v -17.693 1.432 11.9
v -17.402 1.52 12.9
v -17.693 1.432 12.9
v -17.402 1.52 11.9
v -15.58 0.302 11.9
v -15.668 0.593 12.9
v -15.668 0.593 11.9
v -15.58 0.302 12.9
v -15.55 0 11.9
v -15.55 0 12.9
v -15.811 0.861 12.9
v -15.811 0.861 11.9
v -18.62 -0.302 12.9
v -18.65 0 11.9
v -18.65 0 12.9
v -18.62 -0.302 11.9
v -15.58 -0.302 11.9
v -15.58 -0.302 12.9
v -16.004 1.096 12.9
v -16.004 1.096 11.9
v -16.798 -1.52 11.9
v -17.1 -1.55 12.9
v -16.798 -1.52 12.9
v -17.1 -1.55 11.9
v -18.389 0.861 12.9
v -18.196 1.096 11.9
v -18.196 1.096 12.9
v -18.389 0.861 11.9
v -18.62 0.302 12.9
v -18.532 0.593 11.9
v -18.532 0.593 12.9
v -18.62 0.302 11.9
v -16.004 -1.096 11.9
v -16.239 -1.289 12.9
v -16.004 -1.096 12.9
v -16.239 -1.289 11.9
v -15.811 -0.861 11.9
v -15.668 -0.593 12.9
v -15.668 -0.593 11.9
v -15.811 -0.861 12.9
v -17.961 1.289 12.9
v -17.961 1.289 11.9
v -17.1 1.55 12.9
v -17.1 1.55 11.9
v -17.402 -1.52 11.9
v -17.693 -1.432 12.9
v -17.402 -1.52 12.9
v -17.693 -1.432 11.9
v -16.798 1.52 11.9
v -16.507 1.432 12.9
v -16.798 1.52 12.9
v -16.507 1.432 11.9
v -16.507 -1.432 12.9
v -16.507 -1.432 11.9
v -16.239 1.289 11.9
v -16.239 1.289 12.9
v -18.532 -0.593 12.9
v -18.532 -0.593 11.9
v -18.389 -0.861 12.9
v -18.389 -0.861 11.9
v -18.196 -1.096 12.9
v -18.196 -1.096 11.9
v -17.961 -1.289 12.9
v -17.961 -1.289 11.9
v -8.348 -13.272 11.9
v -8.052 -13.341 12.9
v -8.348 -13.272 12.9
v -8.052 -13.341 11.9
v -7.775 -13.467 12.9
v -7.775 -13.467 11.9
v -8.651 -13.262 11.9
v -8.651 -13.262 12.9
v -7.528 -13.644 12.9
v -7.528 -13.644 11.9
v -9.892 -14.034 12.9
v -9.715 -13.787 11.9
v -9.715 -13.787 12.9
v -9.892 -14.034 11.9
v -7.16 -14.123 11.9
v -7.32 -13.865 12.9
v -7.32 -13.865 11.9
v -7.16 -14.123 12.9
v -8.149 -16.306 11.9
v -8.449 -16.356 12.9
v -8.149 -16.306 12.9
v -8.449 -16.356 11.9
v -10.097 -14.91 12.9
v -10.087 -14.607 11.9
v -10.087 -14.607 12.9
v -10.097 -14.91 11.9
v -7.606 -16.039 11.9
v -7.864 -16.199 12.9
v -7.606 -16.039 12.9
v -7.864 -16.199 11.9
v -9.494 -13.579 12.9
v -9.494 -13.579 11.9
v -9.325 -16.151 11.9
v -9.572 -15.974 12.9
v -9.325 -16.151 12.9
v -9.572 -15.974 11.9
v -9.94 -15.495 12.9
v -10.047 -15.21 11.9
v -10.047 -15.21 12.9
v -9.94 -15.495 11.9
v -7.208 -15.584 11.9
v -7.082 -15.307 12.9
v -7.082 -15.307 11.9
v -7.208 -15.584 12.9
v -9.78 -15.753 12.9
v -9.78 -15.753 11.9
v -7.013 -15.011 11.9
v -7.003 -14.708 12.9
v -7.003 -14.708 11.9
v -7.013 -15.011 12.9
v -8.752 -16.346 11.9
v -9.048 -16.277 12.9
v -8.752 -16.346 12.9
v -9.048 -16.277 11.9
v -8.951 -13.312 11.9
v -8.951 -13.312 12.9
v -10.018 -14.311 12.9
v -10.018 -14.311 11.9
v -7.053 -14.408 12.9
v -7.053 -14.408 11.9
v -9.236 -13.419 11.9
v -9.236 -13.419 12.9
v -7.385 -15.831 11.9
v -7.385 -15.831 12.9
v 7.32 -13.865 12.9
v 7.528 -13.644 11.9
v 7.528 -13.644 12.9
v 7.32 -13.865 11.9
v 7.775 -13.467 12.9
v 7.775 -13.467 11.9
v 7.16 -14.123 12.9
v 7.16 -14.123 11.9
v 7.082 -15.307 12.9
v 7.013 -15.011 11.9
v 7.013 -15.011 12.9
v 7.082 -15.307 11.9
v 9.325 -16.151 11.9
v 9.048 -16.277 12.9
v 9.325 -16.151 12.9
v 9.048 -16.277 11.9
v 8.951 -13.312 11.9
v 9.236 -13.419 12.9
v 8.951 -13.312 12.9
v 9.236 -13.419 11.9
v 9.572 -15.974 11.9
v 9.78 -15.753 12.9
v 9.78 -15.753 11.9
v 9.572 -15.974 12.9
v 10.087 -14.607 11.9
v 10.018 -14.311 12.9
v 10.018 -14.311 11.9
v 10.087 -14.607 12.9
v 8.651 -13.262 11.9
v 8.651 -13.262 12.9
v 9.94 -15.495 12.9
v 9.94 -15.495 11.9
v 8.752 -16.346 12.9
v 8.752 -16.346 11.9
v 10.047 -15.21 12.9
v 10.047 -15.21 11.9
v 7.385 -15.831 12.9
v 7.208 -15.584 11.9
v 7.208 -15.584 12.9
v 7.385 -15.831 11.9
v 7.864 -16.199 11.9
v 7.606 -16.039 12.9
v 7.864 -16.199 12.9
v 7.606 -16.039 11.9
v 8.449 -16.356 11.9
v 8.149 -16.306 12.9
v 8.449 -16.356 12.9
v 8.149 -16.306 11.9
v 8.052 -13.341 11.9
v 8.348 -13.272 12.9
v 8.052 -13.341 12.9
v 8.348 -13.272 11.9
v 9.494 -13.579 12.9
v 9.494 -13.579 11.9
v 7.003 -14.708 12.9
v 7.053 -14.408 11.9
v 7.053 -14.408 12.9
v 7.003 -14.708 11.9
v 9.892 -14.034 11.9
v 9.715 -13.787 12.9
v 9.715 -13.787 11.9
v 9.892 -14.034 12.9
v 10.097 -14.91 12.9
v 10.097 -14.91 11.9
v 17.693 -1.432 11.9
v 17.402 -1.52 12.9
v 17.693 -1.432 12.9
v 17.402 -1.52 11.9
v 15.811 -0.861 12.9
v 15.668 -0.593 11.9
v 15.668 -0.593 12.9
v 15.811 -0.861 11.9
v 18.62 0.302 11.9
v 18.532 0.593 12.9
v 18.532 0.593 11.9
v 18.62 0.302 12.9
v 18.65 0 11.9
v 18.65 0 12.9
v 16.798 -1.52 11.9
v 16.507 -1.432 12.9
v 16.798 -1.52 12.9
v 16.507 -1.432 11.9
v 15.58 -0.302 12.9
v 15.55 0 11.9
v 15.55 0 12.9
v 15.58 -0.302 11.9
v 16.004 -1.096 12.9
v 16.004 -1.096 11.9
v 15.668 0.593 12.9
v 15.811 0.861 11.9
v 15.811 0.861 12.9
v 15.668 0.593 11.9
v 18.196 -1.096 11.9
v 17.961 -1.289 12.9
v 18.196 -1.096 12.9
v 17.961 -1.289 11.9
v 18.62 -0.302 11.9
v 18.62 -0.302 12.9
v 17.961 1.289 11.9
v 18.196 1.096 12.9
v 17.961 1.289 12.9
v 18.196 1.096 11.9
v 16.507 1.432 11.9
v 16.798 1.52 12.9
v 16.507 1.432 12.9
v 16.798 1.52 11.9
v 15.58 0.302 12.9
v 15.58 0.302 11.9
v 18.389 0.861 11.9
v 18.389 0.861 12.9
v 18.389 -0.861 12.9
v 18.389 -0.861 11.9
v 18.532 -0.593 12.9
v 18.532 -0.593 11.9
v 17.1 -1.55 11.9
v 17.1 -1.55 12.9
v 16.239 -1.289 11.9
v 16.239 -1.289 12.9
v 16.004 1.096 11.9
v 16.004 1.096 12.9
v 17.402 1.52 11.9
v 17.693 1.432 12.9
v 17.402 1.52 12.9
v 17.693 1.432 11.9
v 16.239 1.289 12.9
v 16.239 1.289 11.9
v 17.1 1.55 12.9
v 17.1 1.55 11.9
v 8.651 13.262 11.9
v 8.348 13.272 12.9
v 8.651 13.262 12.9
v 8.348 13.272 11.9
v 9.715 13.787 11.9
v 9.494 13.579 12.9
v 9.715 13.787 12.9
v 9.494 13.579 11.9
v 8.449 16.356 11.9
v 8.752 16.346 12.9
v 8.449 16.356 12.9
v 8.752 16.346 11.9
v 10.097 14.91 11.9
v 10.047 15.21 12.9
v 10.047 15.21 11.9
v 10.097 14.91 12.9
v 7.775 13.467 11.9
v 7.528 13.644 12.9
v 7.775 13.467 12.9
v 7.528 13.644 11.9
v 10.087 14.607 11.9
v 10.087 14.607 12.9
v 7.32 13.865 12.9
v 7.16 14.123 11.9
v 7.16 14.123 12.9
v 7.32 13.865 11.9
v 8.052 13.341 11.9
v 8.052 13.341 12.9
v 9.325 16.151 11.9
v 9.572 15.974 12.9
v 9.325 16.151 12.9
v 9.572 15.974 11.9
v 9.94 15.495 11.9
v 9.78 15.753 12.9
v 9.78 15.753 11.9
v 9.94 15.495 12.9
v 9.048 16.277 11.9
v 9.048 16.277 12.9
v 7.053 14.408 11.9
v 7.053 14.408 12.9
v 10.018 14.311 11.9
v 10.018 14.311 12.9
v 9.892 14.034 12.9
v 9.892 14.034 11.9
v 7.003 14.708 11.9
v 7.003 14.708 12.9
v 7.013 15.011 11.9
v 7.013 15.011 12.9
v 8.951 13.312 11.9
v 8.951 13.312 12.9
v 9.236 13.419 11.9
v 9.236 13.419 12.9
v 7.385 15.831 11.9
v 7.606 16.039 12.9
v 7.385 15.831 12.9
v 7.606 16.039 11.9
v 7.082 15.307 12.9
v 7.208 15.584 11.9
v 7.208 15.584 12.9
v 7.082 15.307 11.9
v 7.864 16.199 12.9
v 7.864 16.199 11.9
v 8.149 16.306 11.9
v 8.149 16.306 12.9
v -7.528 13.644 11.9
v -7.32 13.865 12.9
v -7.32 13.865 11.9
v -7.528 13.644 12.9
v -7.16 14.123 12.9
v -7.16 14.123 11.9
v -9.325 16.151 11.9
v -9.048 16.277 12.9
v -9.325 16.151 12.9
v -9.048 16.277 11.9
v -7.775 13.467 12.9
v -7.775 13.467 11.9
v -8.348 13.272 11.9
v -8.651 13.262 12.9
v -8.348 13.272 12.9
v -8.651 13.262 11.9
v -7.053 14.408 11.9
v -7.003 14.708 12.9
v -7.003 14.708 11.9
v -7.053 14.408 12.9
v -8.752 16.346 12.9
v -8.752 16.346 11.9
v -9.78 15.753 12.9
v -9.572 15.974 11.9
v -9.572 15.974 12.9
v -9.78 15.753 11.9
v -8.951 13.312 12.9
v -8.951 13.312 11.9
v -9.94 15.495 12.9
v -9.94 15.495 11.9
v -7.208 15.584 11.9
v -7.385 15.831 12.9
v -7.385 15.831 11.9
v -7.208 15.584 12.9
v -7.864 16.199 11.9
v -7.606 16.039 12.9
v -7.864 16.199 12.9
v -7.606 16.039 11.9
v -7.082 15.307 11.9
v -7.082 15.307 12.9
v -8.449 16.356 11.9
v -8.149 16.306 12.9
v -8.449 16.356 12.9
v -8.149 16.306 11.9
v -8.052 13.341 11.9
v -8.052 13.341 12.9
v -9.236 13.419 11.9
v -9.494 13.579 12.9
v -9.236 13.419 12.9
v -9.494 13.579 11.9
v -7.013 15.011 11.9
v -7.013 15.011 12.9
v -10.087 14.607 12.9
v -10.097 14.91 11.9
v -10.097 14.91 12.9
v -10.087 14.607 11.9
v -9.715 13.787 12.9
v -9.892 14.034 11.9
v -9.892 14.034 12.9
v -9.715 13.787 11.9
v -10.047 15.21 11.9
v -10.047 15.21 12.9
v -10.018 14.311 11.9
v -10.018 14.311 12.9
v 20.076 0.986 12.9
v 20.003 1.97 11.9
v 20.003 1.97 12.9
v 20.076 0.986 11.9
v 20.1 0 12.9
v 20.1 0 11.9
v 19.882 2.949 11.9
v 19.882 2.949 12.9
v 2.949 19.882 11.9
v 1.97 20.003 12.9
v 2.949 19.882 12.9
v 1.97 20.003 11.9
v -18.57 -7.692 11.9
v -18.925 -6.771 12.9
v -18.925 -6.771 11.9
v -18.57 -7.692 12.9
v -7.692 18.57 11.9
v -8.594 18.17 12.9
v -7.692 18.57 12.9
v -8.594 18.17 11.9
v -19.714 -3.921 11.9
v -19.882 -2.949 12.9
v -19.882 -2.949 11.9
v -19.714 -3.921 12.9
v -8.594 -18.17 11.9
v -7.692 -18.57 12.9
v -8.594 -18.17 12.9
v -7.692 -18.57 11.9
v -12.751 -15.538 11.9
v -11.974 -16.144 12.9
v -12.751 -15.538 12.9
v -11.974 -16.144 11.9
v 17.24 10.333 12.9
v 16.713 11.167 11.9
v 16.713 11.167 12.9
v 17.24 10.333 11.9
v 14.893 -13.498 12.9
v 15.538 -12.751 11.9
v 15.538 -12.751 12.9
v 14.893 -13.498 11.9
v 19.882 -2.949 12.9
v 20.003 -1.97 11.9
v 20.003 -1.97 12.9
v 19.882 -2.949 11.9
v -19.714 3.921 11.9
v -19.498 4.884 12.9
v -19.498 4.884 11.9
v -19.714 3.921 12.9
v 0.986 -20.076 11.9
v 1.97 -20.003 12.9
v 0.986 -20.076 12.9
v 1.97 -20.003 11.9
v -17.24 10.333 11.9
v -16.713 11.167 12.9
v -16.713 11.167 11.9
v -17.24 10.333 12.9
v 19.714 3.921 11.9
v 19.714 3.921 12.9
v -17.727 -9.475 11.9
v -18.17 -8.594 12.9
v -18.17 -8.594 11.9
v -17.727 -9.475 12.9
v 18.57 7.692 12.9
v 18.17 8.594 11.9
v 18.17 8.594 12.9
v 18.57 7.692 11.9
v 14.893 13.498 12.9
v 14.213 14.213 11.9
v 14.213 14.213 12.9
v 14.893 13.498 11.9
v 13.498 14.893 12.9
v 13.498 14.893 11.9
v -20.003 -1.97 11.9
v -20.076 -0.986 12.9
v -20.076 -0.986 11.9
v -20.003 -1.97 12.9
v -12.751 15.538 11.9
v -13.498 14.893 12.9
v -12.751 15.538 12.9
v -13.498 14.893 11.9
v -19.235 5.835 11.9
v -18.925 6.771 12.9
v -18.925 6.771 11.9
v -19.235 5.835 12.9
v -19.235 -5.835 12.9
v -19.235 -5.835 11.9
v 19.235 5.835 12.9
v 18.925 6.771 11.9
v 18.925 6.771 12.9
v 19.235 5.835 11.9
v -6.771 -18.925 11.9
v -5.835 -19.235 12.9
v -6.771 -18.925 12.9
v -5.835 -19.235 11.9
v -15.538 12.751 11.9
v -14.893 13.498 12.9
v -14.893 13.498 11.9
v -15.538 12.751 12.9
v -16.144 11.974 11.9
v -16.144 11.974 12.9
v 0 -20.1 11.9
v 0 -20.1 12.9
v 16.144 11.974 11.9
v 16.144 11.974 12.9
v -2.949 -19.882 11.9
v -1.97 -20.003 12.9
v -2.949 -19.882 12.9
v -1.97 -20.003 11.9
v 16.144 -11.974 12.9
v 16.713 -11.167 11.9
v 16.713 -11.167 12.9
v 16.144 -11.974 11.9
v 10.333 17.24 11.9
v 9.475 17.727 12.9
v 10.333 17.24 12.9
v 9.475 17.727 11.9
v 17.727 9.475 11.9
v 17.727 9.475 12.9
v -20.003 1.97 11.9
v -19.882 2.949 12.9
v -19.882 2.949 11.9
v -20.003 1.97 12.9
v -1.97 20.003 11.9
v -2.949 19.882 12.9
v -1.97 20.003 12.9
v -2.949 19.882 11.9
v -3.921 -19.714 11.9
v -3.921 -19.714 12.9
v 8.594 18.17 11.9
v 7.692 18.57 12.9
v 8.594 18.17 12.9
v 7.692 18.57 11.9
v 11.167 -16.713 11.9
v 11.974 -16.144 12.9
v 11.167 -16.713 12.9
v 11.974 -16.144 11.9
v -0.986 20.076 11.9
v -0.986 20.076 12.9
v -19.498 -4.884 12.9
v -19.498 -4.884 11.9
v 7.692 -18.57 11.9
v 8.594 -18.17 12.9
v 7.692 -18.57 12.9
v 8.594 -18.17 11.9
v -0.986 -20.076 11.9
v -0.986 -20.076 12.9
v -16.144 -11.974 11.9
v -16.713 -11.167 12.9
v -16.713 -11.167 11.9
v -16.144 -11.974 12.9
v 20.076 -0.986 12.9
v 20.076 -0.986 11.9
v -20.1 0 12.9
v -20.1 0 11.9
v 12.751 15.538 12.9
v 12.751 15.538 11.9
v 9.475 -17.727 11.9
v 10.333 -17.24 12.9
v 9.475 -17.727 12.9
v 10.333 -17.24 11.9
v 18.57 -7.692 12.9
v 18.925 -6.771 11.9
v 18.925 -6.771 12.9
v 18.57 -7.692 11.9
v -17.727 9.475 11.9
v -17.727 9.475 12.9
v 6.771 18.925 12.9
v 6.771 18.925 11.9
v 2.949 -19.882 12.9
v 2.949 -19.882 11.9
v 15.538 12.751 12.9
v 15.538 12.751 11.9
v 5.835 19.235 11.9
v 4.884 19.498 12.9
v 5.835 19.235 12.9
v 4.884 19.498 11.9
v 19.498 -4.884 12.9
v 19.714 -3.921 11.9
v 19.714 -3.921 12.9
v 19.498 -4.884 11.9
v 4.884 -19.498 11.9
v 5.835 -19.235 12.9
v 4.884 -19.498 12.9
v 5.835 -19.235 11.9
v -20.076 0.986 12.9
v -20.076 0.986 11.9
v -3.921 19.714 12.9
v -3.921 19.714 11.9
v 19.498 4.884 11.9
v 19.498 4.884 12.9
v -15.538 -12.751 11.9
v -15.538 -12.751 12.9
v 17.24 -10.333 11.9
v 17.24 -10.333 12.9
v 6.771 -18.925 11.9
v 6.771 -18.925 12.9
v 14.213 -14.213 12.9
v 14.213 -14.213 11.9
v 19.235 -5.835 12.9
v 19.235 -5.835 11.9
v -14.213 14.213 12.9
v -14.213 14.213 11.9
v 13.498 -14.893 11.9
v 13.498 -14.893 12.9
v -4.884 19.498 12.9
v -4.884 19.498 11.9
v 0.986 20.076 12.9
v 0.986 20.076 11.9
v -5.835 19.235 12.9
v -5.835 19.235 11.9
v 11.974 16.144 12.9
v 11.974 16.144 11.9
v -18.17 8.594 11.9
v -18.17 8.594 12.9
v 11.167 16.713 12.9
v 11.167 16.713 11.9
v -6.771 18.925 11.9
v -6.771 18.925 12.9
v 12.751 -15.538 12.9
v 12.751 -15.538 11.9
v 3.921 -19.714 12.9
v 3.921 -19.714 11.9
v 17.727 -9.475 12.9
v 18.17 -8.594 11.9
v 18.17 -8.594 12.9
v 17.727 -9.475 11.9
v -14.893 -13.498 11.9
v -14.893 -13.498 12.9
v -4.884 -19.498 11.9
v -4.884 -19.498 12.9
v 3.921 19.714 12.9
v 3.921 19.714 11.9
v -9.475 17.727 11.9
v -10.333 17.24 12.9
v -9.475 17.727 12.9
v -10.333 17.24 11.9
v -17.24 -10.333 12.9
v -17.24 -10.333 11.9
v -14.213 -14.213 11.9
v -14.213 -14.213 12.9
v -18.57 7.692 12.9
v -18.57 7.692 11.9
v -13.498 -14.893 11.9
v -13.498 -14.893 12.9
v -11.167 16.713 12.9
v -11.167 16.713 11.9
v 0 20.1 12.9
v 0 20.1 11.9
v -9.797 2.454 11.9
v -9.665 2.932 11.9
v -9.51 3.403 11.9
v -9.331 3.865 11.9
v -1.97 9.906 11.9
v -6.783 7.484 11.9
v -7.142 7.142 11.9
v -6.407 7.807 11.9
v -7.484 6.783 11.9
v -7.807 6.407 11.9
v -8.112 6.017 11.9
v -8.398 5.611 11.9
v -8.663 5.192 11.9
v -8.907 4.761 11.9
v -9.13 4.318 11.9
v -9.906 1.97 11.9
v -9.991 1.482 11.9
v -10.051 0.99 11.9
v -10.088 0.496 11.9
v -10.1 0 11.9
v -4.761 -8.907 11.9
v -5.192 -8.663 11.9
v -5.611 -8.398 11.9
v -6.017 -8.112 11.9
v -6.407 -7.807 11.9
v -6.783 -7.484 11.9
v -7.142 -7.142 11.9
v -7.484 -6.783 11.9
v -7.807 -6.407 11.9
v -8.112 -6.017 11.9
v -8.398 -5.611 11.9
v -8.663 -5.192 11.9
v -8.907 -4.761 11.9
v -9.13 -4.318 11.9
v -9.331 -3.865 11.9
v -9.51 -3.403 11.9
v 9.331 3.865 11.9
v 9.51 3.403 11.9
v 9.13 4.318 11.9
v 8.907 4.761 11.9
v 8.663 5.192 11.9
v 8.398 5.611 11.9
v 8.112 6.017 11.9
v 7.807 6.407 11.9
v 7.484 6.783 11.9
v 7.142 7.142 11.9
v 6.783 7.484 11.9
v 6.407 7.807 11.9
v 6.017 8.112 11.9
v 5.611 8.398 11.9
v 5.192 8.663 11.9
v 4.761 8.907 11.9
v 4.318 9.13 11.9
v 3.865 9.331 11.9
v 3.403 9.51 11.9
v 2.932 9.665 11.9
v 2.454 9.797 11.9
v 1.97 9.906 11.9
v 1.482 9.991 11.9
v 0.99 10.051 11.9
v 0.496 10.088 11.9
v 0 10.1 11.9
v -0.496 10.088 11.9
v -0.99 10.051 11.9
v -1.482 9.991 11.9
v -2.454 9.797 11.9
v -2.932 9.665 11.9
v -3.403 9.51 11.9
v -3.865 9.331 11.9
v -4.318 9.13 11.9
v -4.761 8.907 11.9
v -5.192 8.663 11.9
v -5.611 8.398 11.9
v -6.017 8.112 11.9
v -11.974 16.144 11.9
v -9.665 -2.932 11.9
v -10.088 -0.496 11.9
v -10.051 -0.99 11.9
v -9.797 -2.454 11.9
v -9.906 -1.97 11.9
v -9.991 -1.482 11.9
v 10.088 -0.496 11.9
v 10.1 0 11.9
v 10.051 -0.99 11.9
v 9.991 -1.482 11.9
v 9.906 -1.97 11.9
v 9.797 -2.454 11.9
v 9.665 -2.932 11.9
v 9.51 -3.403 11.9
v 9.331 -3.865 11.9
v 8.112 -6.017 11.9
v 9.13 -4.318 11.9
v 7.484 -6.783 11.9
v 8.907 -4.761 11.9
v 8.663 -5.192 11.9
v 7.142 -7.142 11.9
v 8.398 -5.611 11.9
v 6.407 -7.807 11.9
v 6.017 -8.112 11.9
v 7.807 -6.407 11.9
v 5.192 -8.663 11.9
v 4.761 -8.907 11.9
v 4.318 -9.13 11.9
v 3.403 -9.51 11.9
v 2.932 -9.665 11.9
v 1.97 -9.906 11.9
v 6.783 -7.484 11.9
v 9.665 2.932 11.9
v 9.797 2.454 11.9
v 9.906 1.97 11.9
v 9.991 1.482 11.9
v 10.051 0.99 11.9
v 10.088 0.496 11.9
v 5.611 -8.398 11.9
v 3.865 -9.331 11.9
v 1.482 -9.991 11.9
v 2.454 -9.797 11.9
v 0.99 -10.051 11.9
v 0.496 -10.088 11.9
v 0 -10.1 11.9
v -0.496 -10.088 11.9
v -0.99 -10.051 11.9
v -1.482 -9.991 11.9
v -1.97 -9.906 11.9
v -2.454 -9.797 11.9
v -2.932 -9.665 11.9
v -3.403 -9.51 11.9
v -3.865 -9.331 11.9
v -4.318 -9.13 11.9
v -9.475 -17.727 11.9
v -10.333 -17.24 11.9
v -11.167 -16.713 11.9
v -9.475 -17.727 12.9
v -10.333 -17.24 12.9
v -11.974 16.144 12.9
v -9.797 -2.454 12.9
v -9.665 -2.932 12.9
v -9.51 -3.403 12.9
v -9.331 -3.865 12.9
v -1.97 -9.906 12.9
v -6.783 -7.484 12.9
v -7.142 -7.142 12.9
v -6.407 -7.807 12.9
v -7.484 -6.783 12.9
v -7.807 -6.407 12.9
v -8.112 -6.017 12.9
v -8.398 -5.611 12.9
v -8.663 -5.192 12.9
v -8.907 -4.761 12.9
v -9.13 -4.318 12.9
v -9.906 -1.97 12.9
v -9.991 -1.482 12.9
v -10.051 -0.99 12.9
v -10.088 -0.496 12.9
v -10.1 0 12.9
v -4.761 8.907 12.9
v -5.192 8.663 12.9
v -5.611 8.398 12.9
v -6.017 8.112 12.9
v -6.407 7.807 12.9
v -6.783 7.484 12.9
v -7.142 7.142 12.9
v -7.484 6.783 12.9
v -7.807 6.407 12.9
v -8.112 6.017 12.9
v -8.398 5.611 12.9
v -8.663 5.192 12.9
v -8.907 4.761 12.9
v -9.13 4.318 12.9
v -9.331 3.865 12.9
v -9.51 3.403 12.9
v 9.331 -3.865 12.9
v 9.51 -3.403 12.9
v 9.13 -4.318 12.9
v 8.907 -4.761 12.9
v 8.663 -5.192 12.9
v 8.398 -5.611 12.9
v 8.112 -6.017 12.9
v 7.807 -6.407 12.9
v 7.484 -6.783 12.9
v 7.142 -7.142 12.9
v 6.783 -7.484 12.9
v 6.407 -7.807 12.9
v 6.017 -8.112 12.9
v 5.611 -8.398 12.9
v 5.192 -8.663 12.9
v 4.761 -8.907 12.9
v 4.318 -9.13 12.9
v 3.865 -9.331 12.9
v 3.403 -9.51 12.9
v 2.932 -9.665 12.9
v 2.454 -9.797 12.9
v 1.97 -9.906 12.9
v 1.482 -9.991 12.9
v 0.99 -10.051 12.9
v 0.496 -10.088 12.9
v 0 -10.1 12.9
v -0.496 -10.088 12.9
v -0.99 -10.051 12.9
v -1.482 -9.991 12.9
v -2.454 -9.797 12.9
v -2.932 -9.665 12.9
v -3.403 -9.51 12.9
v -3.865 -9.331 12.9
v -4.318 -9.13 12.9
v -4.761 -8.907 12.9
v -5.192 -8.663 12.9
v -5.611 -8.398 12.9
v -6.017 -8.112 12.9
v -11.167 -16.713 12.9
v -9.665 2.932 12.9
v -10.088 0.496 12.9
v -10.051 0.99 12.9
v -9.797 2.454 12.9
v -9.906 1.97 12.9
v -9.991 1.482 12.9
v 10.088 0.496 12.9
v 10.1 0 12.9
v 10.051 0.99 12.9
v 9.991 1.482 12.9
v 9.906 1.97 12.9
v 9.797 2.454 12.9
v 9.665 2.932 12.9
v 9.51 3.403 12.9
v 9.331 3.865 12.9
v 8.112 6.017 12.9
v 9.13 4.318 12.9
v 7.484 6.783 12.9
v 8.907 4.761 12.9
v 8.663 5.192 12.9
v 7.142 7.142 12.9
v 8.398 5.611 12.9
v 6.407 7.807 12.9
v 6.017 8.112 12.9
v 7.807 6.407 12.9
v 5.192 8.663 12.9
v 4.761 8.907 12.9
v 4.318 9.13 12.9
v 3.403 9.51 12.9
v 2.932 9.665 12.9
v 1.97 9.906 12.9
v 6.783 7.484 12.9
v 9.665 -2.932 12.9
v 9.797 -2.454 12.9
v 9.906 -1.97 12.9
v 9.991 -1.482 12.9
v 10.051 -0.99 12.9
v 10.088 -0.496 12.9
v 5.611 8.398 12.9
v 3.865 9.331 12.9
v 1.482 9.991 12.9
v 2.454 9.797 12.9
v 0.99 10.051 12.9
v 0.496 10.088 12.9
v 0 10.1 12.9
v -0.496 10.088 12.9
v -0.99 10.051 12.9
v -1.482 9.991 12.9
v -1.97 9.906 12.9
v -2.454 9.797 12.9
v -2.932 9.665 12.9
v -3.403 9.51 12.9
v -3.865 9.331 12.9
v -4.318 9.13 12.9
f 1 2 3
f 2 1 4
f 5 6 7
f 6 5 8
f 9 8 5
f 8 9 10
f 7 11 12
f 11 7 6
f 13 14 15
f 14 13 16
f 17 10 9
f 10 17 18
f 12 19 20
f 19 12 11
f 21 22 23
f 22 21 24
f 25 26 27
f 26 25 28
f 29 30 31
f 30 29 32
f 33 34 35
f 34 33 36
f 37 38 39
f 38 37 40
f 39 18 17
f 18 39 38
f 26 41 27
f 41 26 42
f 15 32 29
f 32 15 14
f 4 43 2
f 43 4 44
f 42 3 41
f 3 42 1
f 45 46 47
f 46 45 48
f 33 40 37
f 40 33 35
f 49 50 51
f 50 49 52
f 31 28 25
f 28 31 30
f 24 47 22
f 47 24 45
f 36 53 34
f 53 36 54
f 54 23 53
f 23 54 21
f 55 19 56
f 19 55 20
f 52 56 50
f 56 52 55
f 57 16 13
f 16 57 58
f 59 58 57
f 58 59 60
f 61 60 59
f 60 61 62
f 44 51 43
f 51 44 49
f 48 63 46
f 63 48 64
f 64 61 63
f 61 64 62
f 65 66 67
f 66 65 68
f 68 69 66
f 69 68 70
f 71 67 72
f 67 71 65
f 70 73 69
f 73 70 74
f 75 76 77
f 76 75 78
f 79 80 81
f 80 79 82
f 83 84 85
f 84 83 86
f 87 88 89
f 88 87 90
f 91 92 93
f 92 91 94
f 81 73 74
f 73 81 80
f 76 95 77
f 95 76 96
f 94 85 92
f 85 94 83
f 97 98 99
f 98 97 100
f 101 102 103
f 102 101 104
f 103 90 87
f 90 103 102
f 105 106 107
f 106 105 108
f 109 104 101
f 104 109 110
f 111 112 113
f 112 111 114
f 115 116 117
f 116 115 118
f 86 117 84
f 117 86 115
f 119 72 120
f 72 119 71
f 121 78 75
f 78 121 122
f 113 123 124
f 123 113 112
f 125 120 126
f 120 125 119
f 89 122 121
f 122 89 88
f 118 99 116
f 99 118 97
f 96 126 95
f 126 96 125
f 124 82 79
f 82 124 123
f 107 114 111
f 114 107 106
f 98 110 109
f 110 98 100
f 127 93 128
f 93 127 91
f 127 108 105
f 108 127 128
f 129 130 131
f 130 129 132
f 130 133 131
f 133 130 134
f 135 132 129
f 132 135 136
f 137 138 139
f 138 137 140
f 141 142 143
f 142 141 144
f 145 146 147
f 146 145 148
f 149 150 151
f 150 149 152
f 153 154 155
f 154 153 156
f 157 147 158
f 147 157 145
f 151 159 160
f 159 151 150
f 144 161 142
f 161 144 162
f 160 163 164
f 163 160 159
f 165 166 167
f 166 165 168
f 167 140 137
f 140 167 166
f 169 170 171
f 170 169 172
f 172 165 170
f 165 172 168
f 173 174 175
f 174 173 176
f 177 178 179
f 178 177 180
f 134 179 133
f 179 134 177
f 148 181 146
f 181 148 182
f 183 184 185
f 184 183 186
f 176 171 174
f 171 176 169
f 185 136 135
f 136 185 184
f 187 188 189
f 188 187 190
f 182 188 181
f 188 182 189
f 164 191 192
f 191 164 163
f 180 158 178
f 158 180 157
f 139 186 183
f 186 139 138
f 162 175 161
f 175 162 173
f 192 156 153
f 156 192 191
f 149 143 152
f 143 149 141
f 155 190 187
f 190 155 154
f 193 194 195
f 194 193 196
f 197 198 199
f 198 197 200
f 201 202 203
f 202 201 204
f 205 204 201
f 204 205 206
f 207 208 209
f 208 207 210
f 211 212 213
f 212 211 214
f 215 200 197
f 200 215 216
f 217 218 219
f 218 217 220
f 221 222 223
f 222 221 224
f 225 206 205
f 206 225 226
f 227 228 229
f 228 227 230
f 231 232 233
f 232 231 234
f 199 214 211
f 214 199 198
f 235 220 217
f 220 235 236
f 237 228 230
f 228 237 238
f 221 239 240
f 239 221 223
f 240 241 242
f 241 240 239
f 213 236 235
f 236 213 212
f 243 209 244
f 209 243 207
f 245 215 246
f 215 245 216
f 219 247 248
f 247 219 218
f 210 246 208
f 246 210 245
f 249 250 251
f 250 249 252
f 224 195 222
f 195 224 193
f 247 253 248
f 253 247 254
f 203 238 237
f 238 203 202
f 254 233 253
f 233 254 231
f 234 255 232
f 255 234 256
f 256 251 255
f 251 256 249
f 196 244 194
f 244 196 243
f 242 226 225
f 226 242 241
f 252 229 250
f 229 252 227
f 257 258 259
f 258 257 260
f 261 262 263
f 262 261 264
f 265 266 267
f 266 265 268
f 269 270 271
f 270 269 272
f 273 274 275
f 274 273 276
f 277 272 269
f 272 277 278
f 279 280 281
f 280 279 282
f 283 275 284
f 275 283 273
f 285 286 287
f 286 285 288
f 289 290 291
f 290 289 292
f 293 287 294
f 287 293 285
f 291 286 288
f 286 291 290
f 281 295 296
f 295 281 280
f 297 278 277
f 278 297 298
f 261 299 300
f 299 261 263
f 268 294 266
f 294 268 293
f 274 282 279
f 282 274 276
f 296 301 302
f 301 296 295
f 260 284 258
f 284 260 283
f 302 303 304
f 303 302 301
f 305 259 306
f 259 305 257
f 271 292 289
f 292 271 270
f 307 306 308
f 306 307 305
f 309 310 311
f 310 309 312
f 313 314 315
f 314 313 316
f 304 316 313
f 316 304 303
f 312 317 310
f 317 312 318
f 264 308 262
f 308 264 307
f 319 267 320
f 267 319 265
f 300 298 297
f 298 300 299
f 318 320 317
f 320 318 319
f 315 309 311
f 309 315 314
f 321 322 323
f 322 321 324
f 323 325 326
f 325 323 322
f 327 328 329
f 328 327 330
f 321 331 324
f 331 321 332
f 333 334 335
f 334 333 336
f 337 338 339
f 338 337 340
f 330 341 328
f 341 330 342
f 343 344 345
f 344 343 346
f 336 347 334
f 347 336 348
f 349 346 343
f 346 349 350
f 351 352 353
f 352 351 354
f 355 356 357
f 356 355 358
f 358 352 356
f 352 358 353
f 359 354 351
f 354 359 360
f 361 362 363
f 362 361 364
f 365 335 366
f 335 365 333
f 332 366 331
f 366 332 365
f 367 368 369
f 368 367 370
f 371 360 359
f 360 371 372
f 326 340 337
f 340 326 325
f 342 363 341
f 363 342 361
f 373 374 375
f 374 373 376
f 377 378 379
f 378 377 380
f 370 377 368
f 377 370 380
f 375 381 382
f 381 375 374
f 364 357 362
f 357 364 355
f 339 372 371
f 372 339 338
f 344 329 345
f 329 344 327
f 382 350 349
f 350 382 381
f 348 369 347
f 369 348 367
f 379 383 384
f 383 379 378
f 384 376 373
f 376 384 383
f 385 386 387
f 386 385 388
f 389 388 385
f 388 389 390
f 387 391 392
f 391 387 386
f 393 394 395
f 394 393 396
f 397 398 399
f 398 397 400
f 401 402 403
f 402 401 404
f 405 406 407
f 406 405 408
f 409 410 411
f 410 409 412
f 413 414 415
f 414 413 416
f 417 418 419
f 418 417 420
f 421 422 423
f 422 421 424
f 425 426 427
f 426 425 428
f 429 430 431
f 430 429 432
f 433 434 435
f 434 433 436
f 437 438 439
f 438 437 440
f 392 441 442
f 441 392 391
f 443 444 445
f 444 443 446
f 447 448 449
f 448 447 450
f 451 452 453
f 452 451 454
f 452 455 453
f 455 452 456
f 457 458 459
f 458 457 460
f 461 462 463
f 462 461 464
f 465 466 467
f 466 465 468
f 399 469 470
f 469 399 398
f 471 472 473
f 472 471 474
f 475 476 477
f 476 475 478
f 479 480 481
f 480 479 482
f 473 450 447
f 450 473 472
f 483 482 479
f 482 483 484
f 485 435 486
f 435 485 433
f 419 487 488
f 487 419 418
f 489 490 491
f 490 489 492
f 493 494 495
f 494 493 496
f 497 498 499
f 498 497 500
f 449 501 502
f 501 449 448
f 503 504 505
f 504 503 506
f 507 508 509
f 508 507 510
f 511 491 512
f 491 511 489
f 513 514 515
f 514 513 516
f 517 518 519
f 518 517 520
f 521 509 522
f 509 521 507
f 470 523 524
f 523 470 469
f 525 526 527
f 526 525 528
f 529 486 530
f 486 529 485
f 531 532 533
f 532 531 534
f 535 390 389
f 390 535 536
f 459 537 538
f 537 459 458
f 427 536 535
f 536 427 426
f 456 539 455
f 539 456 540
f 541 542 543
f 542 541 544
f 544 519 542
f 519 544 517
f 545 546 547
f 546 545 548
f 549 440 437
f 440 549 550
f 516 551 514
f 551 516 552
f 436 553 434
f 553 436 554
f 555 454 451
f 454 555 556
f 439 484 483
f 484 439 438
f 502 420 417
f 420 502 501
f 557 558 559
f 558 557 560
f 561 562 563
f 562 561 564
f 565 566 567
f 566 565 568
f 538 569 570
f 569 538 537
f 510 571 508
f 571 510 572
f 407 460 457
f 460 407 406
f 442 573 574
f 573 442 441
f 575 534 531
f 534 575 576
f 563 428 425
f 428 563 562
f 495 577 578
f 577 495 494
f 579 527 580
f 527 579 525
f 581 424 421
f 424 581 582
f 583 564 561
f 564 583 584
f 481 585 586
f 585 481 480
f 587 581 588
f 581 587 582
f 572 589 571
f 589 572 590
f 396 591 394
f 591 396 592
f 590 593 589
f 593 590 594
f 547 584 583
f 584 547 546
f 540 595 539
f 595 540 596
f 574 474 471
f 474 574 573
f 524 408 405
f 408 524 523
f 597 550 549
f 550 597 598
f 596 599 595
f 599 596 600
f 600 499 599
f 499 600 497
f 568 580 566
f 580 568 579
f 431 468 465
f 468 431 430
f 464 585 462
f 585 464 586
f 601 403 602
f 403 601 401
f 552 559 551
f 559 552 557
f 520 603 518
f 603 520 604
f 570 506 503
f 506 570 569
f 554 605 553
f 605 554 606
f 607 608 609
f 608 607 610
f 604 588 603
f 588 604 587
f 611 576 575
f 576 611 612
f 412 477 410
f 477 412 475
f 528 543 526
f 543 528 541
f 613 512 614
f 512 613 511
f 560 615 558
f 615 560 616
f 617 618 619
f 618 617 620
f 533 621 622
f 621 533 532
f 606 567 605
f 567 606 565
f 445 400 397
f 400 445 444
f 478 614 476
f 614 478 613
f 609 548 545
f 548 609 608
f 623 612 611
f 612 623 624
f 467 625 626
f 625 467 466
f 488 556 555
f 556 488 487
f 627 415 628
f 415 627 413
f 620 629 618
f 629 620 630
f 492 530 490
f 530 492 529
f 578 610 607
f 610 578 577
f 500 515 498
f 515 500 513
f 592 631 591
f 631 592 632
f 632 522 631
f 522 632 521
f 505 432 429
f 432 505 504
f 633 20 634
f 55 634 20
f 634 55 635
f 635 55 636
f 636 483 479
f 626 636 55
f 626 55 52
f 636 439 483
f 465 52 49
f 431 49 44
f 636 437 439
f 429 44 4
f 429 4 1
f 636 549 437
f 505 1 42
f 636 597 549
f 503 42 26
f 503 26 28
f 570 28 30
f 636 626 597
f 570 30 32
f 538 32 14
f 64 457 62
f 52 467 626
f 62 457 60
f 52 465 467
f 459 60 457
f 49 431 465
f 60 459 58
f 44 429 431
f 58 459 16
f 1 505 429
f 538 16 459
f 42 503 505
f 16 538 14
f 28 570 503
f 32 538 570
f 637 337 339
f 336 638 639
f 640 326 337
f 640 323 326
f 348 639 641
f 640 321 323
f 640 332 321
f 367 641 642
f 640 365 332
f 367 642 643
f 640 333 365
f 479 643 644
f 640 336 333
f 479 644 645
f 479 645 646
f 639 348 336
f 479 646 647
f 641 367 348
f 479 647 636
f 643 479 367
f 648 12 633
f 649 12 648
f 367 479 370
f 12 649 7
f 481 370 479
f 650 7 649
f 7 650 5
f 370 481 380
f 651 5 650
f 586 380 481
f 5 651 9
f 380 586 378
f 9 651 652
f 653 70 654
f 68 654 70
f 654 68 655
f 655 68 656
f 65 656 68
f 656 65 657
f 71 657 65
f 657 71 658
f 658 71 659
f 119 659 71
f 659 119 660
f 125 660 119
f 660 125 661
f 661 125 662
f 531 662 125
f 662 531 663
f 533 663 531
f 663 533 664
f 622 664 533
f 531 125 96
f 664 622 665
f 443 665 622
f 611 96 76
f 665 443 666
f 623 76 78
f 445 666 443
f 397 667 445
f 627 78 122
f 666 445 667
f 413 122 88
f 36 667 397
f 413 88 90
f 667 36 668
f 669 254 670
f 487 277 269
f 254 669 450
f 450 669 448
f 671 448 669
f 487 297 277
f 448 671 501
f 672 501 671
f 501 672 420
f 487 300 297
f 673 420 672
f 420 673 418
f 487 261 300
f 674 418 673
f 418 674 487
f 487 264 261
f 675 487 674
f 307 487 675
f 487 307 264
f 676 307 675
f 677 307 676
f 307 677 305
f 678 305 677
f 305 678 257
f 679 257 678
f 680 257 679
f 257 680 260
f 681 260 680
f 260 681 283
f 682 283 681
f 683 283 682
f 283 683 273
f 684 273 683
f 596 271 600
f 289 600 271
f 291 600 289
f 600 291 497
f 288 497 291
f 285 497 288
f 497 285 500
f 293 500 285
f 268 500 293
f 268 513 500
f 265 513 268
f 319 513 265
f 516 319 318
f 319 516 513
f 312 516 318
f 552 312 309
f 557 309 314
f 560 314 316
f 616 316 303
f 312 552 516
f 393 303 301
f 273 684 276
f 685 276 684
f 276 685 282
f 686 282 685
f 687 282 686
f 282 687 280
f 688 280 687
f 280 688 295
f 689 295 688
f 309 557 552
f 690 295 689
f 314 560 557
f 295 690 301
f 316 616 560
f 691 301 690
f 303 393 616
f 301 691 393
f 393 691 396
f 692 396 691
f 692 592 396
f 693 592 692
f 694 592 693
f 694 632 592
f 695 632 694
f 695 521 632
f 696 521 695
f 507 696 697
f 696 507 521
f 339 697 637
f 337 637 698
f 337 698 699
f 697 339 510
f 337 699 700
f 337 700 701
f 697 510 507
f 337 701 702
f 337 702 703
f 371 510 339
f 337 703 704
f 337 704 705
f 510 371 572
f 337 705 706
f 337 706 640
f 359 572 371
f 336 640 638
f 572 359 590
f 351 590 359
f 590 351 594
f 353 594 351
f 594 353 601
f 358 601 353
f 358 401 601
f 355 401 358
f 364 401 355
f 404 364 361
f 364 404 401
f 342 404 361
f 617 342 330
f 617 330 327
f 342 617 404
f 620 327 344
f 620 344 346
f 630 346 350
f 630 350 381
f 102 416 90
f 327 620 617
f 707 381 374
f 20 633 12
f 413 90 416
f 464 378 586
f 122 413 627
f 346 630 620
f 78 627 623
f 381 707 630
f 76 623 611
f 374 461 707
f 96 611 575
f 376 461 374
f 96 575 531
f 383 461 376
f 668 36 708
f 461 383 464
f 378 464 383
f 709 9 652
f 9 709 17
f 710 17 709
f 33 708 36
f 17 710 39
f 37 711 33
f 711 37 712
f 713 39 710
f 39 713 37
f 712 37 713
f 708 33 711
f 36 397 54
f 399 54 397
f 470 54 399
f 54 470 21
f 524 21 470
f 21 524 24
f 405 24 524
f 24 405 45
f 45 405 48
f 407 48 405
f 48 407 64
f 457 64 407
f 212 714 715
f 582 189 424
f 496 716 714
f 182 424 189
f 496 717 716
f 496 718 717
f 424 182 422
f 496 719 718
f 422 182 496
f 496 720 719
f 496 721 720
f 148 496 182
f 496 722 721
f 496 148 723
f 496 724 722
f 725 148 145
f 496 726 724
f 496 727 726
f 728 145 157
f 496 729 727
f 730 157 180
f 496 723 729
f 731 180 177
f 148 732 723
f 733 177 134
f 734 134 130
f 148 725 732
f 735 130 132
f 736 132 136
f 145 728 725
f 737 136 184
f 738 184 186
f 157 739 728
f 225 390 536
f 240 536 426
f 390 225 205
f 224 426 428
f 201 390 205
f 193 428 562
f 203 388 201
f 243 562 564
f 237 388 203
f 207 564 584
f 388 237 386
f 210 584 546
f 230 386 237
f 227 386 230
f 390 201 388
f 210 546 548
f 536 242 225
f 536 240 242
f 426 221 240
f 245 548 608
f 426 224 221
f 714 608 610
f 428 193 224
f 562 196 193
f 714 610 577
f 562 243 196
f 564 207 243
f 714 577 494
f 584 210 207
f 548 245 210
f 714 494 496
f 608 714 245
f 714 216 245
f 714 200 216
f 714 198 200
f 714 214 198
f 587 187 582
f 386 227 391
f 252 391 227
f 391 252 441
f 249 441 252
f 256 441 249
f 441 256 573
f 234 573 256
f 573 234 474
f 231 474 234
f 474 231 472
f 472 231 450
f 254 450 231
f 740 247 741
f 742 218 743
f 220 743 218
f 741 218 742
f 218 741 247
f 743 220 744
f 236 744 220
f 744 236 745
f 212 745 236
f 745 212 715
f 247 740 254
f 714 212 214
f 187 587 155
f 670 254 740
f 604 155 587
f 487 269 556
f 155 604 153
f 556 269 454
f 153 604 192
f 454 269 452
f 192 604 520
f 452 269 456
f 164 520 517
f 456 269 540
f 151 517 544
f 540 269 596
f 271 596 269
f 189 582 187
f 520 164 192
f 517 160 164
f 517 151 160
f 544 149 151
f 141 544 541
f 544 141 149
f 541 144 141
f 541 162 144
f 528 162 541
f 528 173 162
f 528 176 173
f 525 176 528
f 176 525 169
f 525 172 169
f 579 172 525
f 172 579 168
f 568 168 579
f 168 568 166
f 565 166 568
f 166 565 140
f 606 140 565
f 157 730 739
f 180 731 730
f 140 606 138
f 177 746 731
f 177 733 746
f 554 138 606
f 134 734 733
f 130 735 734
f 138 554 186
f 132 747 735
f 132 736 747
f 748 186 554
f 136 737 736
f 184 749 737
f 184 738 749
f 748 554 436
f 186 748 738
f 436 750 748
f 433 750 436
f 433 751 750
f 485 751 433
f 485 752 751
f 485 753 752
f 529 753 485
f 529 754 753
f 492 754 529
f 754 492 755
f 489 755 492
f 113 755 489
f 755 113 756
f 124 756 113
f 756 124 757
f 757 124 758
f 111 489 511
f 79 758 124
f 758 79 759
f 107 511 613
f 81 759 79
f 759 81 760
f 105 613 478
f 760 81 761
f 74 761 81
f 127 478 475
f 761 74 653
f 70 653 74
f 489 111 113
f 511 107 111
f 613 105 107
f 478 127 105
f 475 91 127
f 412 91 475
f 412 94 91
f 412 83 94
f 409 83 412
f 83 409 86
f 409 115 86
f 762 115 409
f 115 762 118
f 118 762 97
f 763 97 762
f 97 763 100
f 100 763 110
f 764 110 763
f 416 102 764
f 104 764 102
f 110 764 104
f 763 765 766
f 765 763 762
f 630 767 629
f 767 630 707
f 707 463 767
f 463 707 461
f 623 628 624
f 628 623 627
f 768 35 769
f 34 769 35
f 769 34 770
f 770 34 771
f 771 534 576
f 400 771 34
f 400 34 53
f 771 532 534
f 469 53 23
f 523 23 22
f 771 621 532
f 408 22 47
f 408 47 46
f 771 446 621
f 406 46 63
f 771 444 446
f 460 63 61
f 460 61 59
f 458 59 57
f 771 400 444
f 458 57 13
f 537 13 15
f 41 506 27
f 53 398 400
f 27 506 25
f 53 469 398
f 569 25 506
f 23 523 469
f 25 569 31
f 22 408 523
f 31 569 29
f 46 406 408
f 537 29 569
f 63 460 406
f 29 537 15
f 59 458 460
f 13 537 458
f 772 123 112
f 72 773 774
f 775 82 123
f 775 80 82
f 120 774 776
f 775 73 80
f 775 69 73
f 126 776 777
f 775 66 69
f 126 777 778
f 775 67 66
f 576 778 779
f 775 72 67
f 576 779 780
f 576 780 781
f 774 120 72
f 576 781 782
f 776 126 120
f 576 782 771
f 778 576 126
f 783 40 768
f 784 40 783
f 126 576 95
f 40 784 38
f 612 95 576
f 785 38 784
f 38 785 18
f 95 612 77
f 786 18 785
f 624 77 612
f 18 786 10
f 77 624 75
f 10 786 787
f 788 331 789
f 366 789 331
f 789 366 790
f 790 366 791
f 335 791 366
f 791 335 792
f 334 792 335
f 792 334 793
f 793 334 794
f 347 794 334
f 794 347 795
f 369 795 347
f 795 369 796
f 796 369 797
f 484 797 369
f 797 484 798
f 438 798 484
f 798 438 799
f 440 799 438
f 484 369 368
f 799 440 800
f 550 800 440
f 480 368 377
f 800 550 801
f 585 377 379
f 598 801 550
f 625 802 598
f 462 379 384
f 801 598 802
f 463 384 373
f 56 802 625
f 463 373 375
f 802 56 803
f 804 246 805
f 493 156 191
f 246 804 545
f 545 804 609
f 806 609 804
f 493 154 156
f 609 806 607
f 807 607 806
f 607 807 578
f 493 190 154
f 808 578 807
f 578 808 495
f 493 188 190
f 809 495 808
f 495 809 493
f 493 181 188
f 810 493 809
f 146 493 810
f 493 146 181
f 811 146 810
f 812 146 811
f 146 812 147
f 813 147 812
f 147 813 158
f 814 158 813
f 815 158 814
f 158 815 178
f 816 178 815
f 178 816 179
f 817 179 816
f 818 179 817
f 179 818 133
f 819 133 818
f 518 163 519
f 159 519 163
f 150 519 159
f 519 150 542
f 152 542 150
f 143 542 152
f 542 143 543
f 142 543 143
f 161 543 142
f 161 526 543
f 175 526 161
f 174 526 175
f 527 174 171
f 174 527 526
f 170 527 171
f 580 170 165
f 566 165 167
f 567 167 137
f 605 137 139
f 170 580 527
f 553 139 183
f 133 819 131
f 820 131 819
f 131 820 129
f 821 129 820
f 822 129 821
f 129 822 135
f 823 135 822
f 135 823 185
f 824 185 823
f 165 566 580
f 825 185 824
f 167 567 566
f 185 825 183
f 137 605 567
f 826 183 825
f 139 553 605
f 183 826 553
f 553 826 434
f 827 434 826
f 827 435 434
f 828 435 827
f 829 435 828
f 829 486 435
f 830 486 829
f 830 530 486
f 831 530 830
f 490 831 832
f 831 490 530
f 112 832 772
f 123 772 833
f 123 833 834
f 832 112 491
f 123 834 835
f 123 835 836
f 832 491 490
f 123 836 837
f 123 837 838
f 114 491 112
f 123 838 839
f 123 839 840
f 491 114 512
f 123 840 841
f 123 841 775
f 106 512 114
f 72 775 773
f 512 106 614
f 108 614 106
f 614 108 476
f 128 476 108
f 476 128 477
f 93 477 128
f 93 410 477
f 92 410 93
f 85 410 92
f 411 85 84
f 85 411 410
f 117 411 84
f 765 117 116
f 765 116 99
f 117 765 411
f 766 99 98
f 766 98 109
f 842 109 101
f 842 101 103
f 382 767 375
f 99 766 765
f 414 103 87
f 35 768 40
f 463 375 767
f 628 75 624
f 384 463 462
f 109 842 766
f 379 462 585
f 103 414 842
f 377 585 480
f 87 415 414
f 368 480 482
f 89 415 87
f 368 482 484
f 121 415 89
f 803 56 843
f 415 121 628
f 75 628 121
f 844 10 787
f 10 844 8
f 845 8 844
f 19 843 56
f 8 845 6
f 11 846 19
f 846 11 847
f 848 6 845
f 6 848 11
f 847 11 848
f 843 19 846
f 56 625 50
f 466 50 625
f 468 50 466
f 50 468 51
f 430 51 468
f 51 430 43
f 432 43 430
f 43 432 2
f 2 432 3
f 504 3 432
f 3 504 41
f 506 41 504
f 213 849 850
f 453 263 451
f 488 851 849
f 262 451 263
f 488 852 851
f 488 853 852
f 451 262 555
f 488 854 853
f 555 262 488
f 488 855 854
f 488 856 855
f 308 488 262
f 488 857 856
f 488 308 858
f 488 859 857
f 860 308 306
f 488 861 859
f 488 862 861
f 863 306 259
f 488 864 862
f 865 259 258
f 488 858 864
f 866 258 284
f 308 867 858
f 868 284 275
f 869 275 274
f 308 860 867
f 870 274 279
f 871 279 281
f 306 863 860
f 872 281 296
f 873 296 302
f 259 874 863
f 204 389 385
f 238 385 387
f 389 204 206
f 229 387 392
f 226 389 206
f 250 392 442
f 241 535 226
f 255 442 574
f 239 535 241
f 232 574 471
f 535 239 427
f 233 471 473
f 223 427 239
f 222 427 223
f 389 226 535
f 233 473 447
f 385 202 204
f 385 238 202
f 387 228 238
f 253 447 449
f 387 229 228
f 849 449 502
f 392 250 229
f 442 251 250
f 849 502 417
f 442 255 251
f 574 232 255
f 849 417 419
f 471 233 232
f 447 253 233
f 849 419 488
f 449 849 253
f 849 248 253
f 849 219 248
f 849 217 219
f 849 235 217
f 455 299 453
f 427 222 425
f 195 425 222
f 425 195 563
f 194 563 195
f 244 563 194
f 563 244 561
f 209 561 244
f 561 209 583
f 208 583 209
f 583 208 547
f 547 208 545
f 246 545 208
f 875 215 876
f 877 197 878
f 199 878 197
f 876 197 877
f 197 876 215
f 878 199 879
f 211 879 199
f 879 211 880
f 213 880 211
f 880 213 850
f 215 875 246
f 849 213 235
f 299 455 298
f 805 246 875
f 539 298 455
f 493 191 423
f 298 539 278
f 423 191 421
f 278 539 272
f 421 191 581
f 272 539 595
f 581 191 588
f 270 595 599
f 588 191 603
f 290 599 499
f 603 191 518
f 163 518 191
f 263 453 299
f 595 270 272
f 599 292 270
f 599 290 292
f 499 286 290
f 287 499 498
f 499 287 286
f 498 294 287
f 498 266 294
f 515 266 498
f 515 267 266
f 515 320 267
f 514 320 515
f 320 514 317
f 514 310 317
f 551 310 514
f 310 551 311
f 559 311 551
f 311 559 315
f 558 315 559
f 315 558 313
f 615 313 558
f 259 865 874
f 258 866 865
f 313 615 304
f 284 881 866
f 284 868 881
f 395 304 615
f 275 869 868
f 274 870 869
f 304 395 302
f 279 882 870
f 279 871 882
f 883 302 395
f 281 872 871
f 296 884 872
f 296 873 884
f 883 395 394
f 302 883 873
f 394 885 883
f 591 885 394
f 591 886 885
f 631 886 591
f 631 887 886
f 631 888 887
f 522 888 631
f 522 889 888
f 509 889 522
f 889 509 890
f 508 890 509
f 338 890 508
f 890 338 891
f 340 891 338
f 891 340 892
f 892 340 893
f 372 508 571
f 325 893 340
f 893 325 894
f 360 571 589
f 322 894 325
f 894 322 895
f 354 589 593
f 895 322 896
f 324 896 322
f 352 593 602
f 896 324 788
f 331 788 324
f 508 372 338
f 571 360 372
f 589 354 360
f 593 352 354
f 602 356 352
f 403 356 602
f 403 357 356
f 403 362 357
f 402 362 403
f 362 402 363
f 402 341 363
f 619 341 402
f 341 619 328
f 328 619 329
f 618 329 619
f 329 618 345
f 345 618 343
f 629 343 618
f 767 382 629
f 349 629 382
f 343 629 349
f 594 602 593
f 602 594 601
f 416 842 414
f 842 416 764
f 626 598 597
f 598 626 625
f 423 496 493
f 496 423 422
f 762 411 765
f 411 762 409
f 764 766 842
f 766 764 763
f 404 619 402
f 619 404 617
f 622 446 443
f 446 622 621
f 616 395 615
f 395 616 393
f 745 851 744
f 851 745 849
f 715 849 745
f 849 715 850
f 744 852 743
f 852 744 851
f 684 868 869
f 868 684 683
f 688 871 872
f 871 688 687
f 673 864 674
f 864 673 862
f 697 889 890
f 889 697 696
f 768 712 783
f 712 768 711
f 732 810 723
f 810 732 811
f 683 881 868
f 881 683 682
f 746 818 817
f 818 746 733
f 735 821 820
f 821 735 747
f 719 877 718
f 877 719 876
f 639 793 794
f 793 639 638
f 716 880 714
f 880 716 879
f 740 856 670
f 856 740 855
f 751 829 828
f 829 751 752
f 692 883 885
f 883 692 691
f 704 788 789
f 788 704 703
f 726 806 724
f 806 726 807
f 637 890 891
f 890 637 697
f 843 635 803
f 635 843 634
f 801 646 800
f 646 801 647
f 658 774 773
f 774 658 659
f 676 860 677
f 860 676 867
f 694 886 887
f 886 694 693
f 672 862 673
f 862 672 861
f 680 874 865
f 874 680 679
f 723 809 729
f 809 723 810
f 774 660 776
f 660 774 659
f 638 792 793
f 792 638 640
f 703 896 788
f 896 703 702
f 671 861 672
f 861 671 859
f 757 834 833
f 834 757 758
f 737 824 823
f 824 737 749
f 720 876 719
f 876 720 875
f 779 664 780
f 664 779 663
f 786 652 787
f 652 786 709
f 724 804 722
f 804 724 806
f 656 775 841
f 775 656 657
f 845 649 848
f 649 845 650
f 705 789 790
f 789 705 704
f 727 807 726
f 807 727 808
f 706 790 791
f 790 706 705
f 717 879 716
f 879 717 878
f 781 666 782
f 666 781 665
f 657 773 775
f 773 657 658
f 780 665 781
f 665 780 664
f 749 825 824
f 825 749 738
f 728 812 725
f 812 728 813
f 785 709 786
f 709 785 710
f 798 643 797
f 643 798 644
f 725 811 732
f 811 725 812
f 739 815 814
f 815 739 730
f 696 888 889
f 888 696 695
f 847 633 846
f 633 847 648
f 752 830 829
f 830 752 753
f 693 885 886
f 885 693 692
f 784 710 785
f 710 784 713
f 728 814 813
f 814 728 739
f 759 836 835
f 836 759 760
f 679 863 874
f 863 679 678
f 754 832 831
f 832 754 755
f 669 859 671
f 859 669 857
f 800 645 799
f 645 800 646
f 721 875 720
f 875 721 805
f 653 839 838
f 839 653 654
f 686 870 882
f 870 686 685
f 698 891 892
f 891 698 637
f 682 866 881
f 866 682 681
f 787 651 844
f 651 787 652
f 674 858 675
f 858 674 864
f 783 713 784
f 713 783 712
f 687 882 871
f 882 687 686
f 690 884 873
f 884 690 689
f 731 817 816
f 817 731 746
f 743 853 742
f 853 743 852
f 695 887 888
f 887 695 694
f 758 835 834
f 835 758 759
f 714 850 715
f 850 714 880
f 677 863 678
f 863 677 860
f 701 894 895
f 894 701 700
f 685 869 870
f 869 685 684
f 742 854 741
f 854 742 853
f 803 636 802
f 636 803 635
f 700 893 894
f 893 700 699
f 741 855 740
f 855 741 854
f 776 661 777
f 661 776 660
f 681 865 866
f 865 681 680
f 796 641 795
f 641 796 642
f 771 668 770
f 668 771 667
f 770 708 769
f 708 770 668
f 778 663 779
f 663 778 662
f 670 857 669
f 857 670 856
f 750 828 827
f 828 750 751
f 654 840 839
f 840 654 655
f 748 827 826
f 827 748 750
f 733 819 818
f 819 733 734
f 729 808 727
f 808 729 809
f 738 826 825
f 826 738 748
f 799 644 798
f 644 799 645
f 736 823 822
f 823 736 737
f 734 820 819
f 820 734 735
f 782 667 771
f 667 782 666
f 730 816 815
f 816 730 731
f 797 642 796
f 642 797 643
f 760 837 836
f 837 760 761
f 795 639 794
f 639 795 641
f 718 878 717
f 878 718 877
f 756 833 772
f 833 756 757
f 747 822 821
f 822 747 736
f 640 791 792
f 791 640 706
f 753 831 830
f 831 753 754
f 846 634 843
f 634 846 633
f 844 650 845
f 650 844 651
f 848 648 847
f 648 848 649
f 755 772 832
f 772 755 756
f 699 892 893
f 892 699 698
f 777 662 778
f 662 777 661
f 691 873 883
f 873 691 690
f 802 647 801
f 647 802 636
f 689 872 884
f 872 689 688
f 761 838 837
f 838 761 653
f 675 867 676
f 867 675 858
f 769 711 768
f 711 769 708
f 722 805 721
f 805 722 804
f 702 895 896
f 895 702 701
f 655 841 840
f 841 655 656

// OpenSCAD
padding=0.1;
wallsThickness=2;


interiorRadius=10+padding;
interiorHeight=10;

exteriorRadius=interiorRadius+2*wallsThickness;
exteriorHeight=interiorHeight+wallsThickness-padding;

ledgeThickness=3;
ledgeHeight=exteriorHeight/4;

ledgeRadius=exteriorRadius+ledgeThickness*2;

topCoverThickness=2;

screwHolesRadius=3.1/2;
nbScrewHoles=6;
screwHolesDistFromEdge=ledgeThickness;

gasketThickness=1;

module screwHoles()
{
for ( i = [0 : nbScrewHoles-1] )
{
    rotate( i * 360 / 6, [0, 0, 1])
		{
			translate([-ledgeRadius+screwHolesDistFromEdge,0,exteriorHeight-2*ledgeThickness])
			{
   			cylinder(r=screwHolesRadius, h=2*ledgeThickness+padding, $fn=32);
			}
		}
}
}


module mainBoxNoHoles()
{
difference()
{
cylinder(r=exteriorRadius, h=exteriorHeight, $fn=128);

translate([00,0,wallsThickness])
cylinder(r=interiorRadius,interiorRadius, h=interiorHeight, $fn=128);
}


difference()
{
	translate([0,0,exteriorHeight-ledgeHeight])
	{
		cylinder(r1=exteriorRadius,r2=ledgeRadius, h=ledgeHeight, $fn=128);
	}
translate([0,0,padding])
	{
	cylinder(r=interiorRadius, h=exteriorHeight, $fn=128);
	}
}

}


module halfSphere(internalRadius,wallsThickness,fn=64)
{
    difference()
    {
    sphere(r=internalRadius+wallsThickness,$fn=fn);
    sphere(r=internalRadius,$fn=fn);
    translate([-internalRadius-wallsThickness-padding/2,-internalRadius-wallsThickness-padding/2,-internalRadius-wallsThickness])
    cube([2*(internalRadius+wallsThickness+padding),2*(internalRadius+wallsThickness+padding),internalRadius+wallsThickness]);
    }
}

module mainBox2NoHoles()
{
difference()
{
cylinder(r=exteriorRadius, h=exteriorHeight, $fn=128);

translate([0,0,-padding/2])
cylinder(r=interiorRadius,interiorRadius, h=exteriorHeight+padding, $fn=128);
}


difference()
{
	translate([0,0,exteriorHeight-ledgeHeight])
	{
		cylinder(,r=ledgeRadius, h=ledgeHeight, $fn=128);
	}
translate([0,0,padding])
	{
	cylinder(r=interiorRadius, h=exteriorHeight, $fn=128);
	}
}

rotate([0,180,0])
halfSphere(interiorRadius,exteriorRadius-interiorRadius,fn=128);

}

module mainBoxLidNoHoles()
{
translate([0,0,exteriorHeight])
{
	cylinder(r=ledgeRadius, h=topCoverThickness, $fn=128);
}
}

module mainBoxLidWithHoles()
{

    difference()
    {
        
	mainBoxLidNoHoles();
        
    translate([0,0,topCoverThickness])
        screwHoles();    
    }

}


module mainBoxGasketNoCentralHole()
{
    difference()
    {
        translate([0,0,exteriorHeight])
        {
            cylinder(r=ledgeRadius, h=gasketThickness, $fn=128);
        }
        translate([0,0,topCoverThickness])
        screwHoles();    
    }
}


module mainBoxGasketWithCentralHole()
{
    difference()
    {
        mainBoxGasketNoCentralHole();
        translate([0,0,exteriorHeight-padding])
        {
            cylinder(r=interiorRadius, h=exteriorHeight, $fn=128);
        }
        
    }
}


mainBoxGasketWithCentralHole();

module mainBoxWithHoles()
{
difference()
{
mainBoxNoHoles();
screwHoles();
}
}

module mainBox2WithHoles()
{
difference()
{
mainBox2NoHoles();
screwHoles();
}
}



/*rotate([0,180,0])
mainBox2WithHoles();*/
//halfSphere(30,2);

 //mainBoxWithHoles();

//mainBoxLidWithHoles();

/*
difference()
{
cube([exteriorX,exteriorY,exteriorZ]);
translate([wallsThickness,wallsThickness,wallsThickness])
{
	cube([interiorX,interiorY,interiorZ]);
}
}*/
